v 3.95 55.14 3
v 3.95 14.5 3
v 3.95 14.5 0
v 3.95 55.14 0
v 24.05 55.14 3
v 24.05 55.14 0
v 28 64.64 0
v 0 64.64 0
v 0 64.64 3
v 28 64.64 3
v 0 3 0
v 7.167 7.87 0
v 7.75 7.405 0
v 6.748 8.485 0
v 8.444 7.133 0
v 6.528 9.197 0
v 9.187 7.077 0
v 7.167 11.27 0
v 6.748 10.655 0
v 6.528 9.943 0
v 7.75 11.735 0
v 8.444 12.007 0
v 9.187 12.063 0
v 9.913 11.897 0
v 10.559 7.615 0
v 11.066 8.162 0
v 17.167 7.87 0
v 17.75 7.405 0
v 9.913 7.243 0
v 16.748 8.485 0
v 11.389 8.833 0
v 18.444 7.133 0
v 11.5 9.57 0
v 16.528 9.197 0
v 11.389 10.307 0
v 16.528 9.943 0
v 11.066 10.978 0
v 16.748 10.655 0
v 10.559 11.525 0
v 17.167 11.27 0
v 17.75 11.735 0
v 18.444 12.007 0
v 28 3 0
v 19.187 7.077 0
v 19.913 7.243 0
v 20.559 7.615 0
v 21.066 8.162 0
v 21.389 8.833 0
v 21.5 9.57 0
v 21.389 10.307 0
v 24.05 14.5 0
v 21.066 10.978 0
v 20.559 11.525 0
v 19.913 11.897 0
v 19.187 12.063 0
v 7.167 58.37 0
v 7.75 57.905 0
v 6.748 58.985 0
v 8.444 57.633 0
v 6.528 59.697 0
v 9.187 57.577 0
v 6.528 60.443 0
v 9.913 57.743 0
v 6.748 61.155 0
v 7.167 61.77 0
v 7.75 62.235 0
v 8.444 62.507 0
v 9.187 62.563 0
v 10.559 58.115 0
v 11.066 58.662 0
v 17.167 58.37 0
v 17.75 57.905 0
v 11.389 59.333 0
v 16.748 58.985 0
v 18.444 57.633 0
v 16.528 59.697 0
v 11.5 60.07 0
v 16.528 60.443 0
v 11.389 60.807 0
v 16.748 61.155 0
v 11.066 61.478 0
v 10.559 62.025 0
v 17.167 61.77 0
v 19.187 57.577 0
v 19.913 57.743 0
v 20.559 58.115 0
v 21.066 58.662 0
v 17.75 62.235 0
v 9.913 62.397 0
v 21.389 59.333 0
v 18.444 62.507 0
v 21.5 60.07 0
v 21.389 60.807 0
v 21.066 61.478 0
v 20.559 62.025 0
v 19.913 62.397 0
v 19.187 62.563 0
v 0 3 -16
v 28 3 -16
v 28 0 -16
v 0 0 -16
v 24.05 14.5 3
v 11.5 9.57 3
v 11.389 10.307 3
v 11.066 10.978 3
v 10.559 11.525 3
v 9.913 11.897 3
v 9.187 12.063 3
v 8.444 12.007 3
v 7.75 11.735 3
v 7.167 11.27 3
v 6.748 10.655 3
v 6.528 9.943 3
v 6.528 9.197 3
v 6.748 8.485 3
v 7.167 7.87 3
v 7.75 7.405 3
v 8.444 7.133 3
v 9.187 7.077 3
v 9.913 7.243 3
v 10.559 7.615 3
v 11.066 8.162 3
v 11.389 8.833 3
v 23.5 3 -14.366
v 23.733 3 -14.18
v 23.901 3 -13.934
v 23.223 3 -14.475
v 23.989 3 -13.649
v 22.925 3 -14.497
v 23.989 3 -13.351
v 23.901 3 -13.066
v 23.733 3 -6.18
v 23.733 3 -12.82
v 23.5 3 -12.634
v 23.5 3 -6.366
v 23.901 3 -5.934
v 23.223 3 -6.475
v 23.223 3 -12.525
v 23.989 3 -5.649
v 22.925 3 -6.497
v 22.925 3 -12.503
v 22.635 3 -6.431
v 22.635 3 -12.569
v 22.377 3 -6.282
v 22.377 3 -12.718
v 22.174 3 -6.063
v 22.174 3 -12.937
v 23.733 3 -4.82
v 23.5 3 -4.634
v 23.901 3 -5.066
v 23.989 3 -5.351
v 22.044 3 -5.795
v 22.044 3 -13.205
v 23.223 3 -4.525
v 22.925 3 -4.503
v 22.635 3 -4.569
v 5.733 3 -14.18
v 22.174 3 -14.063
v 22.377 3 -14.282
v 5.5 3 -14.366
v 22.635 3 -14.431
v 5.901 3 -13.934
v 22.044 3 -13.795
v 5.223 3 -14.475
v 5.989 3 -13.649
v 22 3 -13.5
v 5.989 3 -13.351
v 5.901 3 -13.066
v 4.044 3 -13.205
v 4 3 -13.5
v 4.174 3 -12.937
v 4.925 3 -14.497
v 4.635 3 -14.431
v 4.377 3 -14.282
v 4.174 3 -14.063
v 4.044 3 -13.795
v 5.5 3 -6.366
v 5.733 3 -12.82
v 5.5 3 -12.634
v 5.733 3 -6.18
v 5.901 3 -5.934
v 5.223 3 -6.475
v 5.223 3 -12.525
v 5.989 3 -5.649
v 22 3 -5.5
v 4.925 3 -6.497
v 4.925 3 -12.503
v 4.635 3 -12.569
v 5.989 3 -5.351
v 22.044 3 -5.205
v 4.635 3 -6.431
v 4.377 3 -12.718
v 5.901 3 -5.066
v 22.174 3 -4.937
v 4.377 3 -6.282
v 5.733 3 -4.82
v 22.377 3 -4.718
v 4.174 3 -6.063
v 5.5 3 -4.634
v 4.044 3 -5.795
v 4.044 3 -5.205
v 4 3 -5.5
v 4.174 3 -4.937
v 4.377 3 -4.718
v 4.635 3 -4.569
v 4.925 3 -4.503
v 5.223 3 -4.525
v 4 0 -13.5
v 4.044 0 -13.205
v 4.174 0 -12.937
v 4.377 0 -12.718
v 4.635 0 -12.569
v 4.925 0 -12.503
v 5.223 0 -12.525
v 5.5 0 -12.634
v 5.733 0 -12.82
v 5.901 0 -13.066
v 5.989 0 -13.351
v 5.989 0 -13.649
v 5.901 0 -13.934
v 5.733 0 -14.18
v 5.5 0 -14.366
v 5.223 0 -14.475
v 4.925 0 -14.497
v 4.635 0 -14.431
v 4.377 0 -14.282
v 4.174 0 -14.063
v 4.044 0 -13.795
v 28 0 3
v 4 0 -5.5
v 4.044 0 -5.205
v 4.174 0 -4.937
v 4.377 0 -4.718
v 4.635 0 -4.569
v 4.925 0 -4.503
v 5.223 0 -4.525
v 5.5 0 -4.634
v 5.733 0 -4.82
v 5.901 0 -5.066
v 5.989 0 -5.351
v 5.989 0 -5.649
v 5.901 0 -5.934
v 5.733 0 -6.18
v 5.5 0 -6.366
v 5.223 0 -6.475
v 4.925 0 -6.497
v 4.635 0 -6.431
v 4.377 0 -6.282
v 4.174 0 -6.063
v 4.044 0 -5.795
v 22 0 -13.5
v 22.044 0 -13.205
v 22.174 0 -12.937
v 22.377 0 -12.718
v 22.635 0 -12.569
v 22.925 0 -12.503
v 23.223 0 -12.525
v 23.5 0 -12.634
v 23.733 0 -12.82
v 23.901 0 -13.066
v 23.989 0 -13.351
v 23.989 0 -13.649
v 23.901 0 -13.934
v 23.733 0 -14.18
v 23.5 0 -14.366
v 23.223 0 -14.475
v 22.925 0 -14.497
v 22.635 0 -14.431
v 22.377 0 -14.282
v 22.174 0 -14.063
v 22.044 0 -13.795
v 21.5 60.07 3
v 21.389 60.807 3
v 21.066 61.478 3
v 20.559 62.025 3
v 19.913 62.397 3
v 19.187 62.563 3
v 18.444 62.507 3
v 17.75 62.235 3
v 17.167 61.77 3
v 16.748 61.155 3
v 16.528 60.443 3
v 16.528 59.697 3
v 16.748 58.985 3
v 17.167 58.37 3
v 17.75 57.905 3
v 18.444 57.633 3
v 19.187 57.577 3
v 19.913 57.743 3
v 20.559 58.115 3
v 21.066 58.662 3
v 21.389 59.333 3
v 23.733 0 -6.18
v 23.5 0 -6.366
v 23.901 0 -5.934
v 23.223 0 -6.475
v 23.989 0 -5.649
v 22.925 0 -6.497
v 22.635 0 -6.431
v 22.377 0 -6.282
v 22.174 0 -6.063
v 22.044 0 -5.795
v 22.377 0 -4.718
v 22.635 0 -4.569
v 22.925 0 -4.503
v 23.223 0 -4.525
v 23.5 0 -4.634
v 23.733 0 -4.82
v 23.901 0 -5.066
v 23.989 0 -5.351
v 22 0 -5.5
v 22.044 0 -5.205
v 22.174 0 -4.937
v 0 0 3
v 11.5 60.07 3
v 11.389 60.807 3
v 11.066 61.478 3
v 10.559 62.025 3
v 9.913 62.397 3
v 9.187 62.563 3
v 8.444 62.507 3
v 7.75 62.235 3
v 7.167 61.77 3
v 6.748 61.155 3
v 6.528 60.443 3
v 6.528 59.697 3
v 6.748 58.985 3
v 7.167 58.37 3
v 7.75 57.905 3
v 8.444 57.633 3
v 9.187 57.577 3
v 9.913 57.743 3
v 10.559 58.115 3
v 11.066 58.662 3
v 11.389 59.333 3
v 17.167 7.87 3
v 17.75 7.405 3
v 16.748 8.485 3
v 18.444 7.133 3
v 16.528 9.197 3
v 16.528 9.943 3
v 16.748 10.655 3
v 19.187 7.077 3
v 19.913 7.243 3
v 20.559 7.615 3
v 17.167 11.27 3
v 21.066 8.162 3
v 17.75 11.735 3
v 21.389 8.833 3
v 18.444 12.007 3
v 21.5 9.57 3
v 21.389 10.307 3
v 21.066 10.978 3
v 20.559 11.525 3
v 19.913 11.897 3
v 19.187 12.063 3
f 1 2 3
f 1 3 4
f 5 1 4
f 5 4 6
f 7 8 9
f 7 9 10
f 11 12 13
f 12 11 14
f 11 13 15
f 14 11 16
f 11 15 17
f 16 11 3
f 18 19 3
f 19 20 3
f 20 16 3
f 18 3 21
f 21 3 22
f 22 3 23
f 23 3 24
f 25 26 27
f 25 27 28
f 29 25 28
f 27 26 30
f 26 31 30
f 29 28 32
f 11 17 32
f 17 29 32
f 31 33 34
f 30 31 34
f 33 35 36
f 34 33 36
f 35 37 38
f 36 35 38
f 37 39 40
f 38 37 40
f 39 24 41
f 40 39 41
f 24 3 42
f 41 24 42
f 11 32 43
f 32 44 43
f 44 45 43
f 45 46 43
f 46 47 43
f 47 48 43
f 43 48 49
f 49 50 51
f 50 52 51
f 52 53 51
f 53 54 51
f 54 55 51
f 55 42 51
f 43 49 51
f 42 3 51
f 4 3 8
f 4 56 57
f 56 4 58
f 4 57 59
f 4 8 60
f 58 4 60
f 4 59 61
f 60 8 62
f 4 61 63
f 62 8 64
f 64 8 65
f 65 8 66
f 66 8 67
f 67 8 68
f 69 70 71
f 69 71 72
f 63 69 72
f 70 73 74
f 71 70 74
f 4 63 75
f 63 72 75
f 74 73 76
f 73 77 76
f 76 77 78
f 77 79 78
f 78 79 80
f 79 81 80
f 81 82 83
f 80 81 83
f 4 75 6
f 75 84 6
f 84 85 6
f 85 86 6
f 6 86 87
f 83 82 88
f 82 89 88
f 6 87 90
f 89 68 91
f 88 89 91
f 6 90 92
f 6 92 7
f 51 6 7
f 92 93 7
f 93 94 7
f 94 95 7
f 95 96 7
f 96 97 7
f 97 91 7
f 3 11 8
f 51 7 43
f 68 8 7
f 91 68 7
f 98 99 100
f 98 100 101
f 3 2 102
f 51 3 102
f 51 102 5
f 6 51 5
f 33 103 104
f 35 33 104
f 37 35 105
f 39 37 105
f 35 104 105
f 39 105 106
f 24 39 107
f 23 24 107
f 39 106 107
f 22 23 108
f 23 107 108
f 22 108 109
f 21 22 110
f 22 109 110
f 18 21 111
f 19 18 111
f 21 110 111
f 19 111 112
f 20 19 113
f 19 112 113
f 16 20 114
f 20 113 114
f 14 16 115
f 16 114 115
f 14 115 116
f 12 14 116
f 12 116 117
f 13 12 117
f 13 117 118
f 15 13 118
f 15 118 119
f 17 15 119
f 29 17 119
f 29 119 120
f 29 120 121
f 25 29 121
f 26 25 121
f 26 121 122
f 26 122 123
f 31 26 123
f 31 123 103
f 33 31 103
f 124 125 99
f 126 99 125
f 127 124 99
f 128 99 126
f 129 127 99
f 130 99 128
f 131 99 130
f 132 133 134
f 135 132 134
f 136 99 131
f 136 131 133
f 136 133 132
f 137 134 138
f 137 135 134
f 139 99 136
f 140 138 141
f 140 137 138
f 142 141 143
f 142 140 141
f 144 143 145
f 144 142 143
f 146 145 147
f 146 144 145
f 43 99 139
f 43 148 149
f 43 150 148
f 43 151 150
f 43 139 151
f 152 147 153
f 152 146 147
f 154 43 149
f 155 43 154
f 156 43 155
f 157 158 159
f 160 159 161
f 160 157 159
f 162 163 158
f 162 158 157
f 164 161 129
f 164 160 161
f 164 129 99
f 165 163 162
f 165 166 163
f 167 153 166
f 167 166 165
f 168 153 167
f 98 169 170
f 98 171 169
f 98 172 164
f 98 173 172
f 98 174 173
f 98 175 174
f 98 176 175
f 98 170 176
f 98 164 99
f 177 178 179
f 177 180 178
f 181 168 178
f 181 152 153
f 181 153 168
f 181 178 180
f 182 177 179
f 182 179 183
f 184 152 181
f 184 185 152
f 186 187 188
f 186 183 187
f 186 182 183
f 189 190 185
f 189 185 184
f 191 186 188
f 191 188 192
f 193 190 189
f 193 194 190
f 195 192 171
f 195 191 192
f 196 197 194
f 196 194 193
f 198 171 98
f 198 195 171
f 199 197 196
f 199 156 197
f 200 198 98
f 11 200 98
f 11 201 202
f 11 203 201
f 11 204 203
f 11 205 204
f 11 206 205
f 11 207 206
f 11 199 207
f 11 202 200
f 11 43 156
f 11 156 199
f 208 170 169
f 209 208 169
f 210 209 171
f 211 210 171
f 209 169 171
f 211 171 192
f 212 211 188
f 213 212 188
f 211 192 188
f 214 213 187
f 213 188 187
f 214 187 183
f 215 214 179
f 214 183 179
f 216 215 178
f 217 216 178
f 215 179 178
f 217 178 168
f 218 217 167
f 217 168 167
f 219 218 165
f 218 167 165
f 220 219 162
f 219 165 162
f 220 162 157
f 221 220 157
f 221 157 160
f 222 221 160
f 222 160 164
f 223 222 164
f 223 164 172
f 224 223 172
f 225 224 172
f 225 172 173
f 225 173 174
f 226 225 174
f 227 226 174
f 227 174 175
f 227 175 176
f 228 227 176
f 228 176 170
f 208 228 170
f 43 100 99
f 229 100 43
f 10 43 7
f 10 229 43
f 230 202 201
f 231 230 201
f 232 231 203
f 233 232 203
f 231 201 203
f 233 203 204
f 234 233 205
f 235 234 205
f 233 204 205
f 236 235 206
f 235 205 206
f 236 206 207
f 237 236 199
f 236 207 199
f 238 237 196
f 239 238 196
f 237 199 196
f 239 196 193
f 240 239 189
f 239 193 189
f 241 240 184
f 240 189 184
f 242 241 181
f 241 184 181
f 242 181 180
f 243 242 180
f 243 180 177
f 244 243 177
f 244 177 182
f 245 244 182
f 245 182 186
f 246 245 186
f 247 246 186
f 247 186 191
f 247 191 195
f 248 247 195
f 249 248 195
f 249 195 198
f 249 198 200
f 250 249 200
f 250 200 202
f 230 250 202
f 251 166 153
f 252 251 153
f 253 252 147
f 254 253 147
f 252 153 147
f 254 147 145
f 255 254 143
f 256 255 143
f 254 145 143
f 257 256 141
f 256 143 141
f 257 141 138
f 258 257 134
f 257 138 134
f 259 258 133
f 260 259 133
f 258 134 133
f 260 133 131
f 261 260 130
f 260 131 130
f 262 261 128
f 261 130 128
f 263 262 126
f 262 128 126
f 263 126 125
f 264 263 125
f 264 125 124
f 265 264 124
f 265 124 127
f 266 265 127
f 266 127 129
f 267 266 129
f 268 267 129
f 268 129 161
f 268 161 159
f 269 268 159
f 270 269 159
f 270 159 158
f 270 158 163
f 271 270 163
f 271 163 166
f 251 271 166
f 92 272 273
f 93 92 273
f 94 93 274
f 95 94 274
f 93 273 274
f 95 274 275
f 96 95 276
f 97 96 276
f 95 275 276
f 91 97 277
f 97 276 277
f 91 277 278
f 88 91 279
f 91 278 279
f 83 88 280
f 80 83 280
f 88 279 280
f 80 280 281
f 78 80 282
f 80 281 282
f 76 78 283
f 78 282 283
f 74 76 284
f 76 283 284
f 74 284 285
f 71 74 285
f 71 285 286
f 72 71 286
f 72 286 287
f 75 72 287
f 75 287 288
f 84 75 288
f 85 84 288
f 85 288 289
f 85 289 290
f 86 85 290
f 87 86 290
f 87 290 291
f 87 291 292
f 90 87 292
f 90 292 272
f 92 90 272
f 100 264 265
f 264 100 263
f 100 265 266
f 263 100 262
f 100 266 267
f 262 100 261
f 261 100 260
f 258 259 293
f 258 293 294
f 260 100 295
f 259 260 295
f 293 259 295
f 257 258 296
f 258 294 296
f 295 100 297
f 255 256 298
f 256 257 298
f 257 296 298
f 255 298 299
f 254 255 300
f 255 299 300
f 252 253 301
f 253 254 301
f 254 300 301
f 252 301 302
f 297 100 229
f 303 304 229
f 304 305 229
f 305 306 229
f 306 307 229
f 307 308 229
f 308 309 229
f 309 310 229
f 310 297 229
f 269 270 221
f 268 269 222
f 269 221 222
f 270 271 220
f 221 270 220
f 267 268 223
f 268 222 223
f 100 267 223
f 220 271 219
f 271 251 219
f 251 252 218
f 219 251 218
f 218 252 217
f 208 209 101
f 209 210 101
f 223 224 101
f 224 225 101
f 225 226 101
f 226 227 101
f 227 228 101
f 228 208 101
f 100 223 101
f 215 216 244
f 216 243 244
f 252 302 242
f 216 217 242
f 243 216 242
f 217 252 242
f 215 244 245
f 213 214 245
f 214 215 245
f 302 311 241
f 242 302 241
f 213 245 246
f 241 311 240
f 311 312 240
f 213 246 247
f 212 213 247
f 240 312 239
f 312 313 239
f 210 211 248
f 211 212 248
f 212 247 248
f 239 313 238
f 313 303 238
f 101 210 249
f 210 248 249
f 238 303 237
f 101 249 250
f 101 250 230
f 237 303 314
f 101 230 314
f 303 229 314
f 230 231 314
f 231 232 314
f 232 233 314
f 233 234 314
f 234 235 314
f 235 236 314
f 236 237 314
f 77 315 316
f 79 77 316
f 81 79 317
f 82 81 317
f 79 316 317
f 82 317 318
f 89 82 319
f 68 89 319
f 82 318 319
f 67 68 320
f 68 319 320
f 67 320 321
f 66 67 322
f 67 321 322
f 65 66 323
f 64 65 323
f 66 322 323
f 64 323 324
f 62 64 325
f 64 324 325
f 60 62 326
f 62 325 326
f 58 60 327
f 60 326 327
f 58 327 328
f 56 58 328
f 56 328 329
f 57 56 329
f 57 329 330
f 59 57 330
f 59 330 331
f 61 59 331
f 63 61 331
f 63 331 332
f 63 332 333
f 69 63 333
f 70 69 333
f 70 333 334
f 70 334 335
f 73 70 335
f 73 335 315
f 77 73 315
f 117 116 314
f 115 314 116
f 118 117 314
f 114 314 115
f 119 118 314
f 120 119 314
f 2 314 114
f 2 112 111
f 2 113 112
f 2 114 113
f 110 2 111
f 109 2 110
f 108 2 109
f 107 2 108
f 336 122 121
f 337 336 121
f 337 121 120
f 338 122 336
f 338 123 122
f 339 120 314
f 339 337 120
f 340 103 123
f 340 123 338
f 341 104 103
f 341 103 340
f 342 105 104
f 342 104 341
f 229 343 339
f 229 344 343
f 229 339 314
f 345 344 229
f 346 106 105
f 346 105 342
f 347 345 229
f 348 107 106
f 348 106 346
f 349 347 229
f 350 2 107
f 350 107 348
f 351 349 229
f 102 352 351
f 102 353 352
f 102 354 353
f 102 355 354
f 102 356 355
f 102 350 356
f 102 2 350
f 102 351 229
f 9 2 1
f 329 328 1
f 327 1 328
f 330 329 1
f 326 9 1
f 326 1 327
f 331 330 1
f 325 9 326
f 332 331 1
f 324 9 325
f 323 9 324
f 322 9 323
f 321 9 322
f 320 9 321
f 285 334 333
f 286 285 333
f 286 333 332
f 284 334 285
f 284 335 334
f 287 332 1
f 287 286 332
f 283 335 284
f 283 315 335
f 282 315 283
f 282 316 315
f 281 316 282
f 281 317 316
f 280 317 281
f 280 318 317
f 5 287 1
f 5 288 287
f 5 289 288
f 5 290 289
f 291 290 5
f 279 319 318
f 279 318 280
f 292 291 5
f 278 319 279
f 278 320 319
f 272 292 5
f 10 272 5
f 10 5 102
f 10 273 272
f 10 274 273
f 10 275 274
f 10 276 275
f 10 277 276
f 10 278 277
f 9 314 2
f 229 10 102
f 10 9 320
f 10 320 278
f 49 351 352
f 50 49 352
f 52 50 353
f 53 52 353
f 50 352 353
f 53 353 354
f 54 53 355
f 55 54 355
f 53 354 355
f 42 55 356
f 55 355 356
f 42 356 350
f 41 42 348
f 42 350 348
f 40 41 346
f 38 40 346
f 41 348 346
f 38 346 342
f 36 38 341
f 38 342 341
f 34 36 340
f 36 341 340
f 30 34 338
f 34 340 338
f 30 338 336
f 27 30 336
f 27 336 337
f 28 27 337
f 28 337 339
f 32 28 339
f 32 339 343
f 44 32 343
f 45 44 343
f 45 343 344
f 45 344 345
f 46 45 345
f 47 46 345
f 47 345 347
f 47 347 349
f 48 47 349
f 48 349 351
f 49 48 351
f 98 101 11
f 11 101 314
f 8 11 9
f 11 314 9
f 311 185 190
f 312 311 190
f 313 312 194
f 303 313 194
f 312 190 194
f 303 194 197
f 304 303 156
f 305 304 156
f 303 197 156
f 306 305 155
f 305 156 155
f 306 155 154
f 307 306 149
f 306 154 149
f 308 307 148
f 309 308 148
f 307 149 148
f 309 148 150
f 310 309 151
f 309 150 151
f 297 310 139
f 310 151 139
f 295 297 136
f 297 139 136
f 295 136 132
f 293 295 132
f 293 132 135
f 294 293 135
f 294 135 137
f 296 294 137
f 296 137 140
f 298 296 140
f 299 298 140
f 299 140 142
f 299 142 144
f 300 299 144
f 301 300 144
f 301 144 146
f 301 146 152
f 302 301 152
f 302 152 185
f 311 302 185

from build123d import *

# Parameters (mm, degrees)
SKETCH1_W           = 28
SKETCH1_H           = 64.64
BOSS_EXTRUDE1_DEPTH = 3
SKETCH2_R           = 2.5
CUT_EXTRUDE1_DEPTH  = 71.507656322
SKETCH4_W           = 20.1
SKETCH4_H           = 40.64
CUT_EXTRUDE6_DEPTH  = 10
SKETCH5_W           = 28
SKETCH5_H           = 3
BOSS_EXTRUDE2_DEPTH = 16
SKETCH6_R           = 1
CUT_EXTRUDE7_DEPTH  = 10


with BuildPart() as part:
    # Sketch1 → Boss-Extrude1 (new body)
    with BuildSketch(Plane.XY):
        with Locations((14, 32.32)):
            Rectangle(SKETCH1_W, SKETCH1_H)
    extrude(amount=BOSS_EXTRUDE1_DEPTH)

    # Sketch2 → Cut-Extrude1 (cut, through all)
    with BuildSketch(Plane.XY.offset(3)):
        with Locations((9, 9.57)):
            Circle(SKETCH2_R)
        with Locations((19, 9.57)):
            Circle(SKETCH2_R)
        with Locations((9, 60.07)):
            Circle(SKETCH2_R)
        with Locations((19, 60.07)):
            Circle(SKETCH2_R)
    extrude(amount=-CUT_EXTRUDE1_DEPTH, mode=Mode.SUBTRACT)

    # Sketch4 → Cut-Extrude6 (cut)
    with BuildSketch(Plane.XY.offset(3)):
        with Locations((14, 34.82)):
            Rectangle(SKETCH4_W, SKETCH4_H)
    extrude(amount=-CUT_EXTRUDE6_DEPTH, mode=Mode.SUBTRACT)

    # Sketch5 → Boss-Extrude2 (add)
    with BuildSketch(Plane(origin=(0, 0, 0), x_dir=(-1, 0, 0), z_dir=(0, 0, -1))):
        with Locations((-14, 1.5)):
            Rectangle(SKETCH5_W, SKETCH5_H)
    extrude(amount=BOSS_EXTRUDE2_DEPTH)

    # Sketch6 → Cut-Extrude7 (cut)
    with BuildSketch(Plane(origin=(0, 3, 0), x_dir=(1, 0, 0), z_dir=(0, 1, 0))):
        with Locations(Location((5, 5.5, 0), (0, 0, 180))):
            Circle(SKETCH6_R)
        with Locations(Location((5, 13.5, 0), (0, 0, 180))):
            Circle(SKETCH6_R)
        with Locations(Location((23, 13.5, 0), (0, 0, 180))):
            Circle(SKETCH6_R)
        with Locations(Location((23, 5.5, 0), (0, 0, 180))):
            Circle(SKETCH6_R)
    extrude(amount=-CUT_EXTRUDE7_DEPTH, mode=Mode.SUBTRACT)


solid = part.part
